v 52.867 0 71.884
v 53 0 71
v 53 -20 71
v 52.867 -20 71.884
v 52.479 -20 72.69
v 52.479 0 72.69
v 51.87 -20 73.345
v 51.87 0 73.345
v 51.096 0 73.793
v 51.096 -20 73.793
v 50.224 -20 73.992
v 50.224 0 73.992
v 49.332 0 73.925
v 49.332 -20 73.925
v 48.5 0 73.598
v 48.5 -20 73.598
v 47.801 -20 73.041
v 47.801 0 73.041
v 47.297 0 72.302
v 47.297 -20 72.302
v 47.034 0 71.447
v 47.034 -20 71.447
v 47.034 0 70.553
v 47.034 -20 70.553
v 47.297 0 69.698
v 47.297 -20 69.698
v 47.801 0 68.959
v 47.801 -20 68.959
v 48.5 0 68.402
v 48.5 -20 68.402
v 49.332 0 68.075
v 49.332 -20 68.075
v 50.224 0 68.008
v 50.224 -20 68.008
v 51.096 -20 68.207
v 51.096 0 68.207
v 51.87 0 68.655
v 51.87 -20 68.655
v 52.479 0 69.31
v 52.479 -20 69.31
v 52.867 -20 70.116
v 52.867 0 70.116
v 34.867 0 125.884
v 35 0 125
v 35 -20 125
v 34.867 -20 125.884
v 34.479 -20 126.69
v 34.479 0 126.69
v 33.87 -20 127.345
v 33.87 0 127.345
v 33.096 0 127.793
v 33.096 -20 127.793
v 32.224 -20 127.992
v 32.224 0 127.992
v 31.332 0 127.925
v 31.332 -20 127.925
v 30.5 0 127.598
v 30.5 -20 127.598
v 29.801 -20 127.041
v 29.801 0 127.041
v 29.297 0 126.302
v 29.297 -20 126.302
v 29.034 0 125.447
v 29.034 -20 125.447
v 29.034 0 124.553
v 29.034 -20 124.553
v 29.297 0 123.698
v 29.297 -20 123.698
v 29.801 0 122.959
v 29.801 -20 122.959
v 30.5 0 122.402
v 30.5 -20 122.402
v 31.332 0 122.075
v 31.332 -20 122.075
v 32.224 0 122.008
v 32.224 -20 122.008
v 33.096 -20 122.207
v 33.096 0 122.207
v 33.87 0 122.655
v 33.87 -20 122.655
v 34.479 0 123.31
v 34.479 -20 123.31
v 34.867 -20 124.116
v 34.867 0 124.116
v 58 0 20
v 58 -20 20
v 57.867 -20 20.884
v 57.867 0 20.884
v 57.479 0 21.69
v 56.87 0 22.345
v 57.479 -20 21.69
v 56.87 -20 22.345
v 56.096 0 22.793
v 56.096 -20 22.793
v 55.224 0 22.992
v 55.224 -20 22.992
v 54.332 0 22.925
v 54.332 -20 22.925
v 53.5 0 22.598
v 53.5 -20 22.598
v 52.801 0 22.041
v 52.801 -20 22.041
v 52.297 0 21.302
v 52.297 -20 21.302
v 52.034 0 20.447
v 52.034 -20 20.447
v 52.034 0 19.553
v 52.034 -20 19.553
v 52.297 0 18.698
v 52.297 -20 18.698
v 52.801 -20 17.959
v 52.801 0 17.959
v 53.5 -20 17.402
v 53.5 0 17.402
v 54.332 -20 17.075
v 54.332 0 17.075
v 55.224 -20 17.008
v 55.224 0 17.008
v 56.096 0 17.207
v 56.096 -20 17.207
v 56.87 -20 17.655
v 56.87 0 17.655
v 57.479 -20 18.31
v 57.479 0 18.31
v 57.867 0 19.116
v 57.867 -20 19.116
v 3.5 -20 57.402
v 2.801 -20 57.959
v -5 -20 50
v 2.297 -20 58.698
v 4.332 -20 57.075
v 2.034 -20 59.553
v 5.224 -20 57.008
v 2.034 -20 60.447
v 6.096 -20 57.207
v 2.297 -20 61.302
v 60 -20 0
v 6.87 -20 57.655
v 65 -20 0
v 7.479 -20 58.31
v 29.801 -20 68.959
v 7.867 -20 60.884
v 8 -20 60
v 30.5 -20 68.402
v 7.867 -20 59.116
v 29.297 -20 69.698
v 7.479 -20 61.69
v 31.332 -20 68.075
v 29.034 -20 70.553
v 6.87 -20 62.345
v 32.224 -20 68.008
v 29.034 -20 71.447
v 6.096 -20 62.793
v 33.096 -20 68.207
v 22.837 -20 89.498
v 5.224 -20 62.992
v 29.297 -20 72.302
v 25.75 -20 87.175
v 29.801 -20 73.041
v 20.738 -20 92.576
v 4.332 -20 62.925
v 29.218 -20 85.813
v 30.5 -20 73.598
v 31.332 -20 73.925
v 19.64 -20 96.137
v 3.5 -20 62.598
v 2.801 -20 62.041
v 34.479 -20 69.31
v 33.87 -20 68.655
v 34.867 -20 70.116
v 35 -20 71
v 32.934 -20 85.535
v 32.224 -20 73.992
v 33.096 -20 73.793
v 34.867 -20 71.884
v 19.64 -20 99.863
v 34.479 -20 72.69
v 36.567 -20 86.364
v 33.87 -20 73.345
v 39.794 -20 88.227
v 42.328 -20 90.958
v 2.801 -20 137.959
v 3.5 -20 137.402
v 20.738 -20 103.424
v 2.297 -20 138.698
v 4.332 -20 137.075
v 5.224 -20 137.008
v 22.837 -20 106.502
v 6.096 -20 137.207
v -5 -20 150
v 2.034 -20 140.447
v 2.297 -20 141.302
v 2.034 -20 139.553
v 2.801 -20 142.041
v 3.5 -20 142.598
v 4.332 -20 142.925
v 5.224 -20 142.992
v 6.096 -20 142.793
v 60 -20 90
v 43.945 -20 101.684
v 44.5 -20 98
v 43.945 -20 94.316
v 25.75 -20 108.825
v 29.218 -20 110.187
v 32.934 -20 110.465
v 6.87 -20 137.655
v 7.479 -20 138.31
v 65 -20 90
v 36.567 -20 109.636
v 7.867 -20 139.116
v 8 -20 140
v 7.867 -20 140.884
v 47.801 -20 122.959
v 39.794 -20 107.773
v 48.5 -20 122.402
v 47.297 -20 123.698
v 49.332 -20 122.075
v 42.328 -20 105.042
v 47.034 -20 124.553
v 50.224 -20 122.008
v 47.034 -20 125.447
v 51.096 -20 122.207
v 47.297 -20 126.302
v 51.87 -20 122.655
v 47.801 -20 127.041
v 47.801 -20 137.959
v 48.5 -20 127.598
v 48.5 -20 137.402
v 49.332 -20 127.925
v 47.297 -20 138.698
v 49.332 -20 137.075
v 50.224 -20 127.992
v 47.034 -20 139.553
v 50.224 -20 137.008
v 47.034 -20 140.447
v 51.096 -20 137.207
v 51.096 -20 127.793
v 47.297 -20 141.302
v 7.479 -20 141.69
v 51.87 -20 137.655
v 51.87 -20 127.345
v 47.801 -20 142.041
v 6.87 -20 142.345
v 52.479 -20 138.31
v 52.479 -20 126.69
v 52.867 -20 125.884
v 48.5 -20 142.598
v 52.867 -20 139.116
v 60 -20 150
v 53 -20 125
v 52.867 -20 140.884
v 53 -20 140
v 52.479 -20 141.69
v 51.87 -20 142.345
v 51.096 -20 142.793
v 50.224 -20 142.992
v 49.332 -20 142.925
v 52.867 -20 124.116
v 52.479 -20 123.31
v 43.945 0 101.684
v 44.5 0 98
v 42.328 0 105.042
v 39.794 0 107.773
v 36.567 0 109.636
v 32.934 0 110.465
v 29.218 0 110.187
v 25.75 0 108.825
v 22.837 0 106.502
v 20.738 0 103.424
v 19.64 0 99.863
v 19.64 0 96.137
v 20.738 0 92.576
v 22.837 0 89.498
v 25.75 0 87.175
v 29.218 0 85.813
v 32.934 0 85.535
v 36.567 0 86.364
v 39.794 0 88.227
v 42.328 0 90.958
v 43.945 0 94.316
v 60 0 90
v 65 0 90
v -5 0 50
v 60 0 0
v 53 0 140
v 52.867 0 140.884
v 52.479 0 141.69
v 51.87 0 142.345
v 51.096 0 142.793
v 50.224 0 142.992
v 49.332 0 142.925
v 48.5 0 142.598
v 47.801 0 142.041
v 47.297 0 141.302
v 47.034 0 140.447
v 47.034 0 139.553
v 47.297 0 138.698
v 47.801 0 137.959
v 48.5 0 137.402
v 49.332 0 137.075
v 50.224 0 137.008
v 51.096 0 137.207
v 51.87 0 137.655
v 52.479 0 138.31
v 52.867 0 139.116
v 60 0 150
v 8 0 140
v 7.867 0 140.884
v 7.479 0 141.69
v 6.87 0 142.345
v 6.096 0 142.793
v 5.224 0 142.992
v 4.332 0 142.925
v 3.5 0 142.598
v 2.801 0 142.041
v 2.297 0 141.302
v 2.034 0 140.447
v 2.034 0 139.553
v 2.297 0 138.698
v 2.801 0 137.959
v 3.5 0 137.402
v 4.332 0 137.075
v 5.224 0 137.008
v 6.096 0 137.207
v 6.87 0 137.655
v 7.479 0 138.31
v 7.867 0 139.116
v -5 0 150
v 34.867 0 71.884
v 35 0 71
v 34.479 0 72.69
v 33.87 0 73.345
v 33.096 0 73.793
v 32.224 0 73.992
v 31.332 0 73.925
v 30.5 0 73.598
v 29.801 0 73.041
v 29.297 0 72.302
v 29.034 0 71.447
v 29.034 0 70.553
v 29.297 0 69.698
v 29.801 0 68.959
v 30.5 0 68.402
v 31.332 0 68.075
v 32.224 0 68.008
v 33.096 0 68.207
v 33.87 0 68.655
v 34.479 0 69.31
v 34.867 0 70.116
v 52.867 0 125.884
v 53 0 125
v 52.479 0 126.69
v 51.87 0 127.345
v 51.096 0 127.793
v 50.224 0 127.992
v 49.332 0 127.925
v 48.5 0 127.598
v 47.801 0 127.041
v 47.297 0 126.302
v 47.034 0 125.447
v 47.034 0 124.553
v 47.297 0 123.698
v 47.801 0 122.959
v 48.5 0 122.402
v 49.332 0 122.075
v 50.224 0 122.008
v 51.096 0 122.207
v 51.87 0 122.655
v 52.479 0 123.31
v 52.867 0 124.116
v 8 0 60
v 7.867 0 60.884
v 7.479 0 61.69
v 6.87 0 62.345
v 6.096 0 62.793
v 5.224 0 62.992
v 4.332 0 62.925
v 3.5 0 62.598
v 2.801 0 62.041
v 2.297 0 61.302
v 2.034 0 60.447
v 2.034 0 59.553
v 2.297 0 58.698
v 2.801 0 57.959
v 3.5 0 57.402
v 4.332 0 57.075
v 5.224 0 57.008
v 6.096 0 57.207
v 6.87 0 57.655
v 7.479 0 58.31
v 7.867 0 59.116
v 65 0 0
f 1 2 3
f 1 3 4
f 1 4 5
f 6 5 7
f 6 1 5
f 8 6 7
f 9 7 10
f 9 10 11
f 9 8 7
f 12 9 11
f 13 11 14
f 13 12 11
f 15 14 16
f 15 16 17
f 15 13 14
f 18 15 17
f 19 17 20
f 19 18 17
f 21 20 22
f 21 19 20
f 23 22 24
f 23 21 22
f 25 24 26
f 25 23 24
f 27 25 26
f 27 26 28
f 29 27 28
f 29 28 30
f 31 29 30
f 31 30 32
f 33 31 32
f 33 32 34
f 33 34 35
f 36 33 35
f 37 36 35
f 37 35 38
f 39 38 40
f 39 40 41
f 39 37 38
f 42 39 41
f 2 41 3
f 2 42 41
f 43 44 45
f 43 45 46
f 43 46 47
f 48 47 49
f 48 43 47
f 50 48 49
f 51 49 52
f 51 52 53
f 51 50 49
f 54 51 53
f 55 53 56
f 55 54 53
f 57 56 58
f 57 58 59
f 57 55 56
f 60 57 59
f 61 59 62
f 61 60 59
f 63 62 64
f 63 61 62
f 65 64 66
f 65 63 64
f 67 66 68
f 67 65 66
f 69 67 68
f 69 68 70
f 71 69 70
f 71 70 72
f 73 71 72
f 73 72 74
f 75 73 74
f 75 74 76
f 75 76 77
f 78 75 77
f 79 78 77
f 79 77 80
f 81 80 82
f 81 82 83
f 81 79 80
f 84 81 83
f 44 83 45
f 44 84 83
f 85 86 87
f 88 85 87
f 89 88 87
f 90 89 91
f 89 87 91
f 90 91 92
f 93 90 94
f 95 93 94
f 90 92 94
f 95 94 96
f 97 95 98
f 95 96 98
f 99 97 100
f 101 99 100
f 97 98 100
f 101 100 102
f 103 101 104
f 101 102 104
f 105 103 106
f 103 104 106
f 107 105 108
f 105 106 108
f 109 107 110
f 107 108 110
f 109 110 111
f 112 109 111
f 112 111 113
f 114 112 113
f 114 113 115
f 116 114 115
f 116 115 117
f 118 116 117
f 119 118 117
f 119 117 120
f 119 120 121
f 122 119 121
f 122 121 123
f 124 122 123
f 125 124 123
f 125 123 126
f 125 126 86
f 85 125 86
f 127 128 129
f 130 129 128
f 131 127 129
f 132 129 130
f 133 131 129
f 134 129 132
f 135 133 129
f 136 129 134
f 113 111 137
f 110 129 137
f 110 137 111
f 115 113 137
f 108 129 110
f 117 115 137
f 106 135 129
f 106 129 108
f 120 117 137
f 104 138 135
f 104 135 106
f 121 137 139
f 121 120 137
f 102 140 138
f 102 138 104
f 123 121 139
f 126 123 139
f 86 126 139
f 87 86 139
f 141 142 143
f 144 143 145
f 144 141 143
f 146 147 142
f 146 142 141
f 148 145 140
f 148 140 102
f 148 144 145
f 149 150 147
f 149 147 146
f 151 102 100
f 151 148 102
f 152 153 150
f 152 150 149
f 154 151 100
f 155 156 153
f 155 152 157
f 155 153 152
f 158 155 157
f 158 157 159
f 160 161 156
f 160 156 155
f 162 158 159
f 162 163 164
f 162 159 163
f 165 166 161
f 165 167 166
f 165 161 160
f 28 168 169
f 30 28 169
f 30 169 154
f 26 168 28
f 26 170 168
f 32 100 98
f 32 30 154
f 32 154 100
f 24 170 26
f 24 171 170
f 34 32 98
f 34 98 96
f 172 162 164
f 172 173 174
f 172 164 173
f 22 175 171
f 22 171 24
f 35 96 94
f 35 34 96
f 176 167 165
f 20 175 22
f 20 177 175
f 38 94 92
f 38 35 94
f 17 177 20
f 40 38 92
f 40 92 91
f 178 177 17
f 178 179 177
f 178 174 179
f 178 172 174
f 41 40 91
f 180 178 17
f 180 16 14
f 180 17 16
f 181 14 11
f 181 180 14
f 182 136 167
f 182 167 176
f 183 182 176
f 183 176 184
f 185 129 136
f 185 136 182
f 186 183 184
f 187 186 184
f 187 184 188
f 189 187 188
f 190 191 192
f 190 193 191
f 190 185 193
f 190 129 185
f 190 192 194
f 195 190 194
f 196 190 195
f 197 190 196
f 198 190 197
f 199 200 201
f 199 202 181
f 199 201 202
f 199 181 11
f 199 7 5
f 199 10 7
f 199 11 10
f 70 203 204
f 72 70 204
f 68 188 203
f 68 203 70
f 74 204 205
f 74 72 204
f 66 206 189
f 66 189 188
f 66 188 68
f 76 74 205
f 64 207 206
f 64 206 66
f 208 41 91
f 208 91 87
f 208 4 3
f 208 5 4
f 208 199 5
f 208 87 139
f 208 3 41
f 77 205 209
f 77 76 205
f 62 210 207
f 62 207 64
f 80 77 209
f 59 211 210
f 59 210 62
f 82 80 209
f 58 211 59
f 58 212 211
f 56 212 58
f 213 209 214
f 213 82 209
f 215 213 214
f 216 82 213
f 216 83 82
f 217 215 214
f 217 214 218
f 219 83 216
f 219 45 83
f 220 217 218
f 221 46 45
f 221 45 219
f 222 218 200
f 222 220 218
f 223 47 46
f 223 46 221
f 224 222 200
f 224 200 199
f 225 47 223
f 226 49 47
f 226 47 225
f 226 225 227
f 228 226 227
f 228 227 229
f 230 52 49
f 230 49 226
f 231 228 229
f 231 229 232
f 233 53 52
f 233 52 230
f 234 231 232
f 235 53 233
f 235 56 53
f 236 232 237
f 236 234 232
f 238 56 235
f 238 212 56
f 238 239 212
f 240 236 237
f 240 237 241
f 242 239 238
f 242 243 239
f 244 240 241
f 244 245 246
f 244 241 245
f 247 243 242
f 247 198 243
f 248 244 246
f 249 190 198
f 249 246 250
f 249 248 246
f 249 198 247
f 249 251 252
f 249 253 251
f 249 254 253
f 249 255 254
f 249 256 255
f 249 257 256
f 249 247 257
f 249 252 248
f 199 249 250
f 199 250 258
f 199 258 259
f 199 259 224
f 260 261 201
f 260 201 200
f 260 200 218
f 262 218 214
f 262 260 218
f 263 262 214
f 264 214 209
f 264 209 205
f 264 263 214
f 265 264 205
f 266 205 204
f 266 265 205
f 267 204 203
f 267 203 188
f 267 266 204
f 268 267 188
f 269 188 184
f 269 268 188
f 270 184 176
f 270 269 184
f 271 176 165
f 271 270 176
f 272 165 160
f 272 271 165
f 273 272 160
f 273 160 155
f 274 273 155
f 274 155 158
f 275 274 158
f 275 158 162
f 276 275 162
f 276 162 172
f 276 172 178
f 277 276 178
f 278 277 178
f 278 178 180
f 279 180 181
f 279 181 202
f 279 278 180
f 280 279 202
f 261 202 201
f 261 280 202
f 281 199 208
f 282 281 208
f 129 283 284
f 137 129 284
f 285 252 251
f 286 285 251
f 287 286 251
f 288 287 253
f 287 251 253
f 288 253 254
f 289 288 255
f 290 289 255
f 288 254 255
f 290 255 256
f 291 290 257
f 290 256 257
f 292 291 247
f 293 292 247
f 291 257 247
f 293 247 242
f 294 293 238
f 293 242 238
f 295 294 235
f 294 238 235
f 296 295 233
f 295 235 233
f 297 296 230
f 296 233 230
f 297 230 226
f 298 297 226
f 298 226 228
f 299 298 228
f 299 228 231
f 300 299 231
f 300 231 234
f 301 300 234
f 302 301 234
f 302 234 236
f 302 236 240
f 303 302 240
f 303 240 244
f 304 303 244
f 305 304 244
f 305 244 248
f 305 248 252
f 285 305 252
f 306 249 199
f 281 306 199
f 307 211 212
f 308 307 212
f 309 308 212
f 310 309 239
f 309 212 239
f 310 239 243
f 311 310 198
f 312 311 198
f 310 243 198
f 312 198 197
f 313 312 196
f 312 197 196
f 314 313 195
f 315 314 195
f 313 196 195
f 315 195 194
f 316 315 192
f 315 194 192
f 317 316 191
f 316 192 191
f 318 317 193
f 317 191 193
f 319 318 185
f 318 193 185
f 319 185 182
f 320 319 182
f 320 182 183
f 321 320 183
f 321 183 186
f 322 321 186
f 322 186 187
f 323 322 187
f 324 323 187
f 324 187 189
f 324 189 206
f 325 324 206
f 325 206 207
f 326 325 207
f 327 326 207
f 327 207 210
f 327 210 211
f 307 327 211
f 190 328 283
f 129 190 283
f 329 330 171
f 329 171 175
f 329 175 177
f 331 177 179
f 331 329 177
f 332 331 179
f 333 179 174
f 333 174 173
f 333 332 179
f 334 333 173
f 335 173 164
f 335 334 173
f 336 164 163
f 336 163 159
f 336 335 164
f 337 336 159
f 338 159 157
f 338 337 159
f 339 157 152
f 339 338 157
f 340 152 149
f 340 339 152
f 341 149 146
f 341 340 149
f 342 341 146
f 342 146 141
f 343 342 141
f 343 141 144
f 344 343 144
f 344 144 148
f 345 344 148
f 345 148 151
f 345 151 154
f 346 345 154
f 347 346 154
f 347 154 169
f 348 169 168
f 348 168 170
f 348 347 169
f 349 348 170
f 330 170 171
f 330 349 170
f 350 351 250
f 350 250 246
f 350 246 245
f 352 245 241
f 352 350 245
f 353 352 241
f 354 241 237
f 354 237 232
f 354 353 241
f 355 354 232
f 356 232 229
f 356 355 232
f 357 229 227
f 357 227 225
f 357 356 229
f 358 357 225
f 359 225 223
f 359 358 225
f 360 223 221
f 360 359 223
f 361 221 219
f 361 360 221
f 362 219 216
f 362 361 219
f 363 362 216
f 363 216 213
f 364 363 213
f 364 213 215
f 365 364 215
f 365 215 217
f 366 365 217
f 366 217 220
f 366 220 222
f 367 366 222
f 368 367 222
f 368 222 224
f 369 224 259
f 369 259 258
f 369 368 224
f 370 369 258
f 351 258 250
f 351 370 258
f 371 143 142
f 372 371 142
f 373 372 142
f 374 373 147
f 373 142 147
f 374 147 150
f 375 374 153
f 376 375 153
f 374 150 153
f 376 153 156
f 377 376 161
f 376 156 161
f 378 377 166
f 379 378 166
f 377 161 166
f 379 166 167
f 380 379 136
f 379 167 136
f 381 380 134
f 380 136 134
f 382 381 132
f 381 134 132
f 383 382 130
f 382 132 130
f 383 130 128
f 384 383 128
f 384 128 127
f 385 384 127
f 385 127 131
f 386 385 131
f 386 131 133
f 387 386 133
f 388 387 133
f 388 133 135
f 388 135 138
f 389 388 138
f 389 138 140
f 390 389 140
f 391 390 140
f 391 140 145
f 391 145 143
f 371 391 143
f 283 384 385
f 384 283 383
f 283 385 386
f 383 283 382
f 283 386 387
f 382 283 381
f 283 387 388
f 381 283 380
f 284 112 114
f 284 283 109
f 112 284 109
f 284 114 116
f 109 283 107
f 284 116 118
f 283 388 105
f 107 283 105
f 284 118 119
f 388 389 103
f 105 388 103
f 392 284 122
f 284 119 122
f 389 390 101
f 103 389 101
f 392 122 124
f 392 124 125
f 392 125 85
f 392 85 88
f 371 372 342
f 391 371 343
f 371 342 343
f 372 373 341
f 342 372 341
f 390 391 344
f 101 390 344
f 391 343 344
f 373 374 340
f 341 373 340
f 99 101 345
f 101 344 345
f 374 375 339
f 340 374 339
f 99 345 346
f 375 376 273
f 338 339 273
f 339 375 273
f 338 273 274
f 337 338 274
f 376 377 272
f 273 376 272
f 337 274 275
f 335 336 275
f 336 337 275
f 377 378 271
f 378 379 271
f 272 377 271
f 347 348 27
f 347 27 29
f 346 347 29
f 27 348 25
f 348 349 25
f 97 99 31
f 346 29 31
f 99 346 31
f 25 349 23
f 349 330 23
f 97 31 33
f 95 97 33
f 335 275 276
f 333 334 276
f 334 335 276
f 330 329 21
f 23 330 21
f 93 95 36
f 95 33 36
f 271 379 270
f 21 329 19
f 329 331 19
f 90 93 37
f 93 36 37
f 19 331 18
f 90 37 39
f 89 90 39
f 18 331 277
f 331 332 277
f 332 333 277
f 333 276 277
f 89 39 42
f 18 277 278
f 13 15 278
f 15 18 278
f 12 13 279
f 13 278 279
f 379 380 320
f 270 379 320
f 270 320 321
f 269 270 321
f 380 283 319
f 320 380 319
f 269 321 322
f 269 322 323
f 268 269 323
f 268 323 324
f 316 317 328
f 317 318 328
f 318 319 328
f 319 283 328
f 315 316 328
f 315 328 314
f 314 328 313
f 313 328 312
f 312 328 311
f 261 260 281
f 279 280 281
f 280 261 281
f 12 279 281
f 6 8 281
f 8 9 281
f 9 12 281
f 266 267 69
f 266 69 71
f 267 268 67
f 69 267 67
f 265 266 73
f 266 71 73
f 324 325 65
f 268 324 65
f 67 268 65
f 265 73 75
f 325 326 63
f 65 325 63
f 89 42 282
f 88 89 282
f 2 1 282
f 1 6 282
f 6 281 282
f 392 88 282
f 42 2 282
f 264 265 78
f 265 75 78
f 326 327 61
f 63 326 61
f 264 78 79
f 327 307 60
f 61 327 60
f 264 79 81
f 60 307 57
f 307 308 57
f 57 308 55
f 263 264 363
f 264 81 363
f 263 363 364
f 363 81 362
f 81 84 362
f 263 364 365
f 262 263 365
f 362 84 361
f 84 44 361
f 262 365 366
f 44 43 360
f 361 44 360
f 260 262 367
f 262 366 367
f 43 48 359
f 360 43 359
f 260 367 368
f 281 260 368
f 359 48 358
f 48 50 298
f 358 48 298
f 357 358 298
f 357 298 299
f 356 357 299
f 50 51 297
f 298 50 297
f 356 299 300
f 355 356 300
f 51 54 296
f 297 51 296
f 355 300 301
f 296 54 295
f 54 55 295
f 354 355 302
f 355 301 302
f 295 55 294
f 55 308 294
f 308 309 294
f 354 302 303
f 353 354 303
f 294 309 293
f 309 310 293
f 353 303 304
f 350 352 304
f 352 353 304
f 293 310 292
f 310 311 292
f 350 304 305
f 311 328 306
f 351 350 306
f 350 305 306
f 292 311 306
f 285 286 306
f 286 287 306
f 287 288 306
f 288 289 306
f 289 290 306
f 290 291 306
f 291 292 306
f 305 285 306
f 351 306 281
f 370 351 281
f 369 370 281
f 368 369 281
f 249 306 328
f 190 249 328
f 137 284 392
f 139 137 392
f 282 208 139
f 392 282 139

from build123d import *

# Parameters (mm, degrees)
F0_R      = 18
F0_R_2    = 3
F0_W      = 3
F0_H      = 29
F0_H_2    = 15
F0_R_3    = 12.5
F1_DEPTH  = 20
F2_DEPTH  = 25
F4_DEPTH  = 25
F5_W      = 22
F5_H      = 19
F6_DEPTH  = 25
F8_DEPTH  = 25
F9_R      = 3
F10_DEPTH = 25


with BuildPart() as f1:
    # F0 (on Front) → F1 (new body)
    with BuildSketch(Plane.XZ):
        Polygon((60, 50), (60, 0), (155, 0), (155, 90), (63, 90), (63, 75), (60, 75), align=None)
        Polygon((1, 75), (60, 75), (60, 90), (60, 119), (1, 119), align=None)
        with Locations((32, 98)):
            Circle(F0_R, mode=Mode.SUBTRACT)
        Polygon((-5, 50), (60, 50), (60, 75), (1, 75), (1, 119), (60, 119), (60, 120), (-5, 120), align=None)
        with Locations((32, 71)):
            Circle(F0_R_2, mode=Mode.SUBTRACT)
        with Locations((50, 71)):
            Circle(F0_R_2, mode=Mode.SUBTRACT)
        Polygon((63, 90), (155, 90), (155, 150), (-5, 150), (-5, 120), (60, 120), (60, 119), (63, 119), align=None)
        with Locations((32, 125)):
            Circle(F0_R_2, mode=Mode.SUBTRACT)
        with Locations((50, 125)):
            Circle(F0_R_2, mode=Mode.SUBTRACT)
        with Locations((61.5, 104.5)):
            Rectangle(F0_W, F0_H)
        with Locations((61.5, 82.5)):
            Rectangle(F0_W, F0_H_2)
        with Locations((32, 98)):
            Circle(F0_R_3)
        with Locations((32, 98)):
            Circle(F0_R)
        with Locations((32, 98)):
            Circle(F0_R_3, mode=Mode.SUBTRACT)
        Polygon((-5, 50), (60, 0), (60, 50), align=None)
    extrude(amount=F1_DEPTH)

    # F0 (on Front) → F2 (cut)
    with BuildSketch(Plane.XZ):
        with Locations((32, 98)):
            Circle(F0_R_3)
    extrude(amount=F2_DEPTH, mode=Mode.SUBTRACT)

    # F3 (on face) → F4 (cut)
    with BuildSketch(Plane.XZ.offset(20)):
        with BuildLine():
            Line((65, 0), (155, 0))
            Line((155, 0), (155, 90))
            Line((155, 90), (70, 90))
            ThreePointArc((70, 90), (66.464466, 88.535534), (65, 85))
            Line((65, 85), (65, 0))
        make_face()
    extrude(amount=-F4_DEPTH, mode=Mode.SUBTRACT)

    # F5 (on face) → F6 (cut)
    with BuildSketch(Plane(origin=(0, 0, 0), x_dir=(-1, 0, 0), z_dir=(0, 1, 0))):
        with Locations((-87, 99.5)):
            Rectangle(F5_W, F5_H)
    extrude(amount=-F6_DEPTH, mode=Mode.SUBTRACT)

    # F7 (on face) → F8 (cut)
    with BuildSketch(Plane.XZ.offset(20)):
        with BuildLine():
            Line((155, 150), (60, 150))
            Line((60, 150), (60, 90))
            Line((60, 90), (65, 90))
            Line((65, 90), (65, 85))
            ThreePointArc((65, 85), (66.464466, 88.535534), (70, 90))
            Line((70, 90), (76, 90))
            Line((76, 90), (76, 109))
            Line((76, 109), (98, 109))
            Line((98, 109), (98, 90))
            Line((98, 90), (155, 90))
            Line((155, 90), (155, 150))
        make_face()
    extrude(amount=-F8_DEPTH, mode=Mode.SUBTRACT)

    # F9 (on face) → F10 (cut)
    with BuildSketch(Plane.XZ.offset(20)):
        with Locations((5, 140)):
            Circle(F9_R)
        with Locations((50, 140)):
            Circle(F9_R)
        with Locations((5, 60)):
            Circle(F9_R)
        with Locations((55, 20)):
            Circle(F9_R)
    extrude(amount=-F10_DEPTH, mode=Mode.SUBTRACT)


solid = f1.part
